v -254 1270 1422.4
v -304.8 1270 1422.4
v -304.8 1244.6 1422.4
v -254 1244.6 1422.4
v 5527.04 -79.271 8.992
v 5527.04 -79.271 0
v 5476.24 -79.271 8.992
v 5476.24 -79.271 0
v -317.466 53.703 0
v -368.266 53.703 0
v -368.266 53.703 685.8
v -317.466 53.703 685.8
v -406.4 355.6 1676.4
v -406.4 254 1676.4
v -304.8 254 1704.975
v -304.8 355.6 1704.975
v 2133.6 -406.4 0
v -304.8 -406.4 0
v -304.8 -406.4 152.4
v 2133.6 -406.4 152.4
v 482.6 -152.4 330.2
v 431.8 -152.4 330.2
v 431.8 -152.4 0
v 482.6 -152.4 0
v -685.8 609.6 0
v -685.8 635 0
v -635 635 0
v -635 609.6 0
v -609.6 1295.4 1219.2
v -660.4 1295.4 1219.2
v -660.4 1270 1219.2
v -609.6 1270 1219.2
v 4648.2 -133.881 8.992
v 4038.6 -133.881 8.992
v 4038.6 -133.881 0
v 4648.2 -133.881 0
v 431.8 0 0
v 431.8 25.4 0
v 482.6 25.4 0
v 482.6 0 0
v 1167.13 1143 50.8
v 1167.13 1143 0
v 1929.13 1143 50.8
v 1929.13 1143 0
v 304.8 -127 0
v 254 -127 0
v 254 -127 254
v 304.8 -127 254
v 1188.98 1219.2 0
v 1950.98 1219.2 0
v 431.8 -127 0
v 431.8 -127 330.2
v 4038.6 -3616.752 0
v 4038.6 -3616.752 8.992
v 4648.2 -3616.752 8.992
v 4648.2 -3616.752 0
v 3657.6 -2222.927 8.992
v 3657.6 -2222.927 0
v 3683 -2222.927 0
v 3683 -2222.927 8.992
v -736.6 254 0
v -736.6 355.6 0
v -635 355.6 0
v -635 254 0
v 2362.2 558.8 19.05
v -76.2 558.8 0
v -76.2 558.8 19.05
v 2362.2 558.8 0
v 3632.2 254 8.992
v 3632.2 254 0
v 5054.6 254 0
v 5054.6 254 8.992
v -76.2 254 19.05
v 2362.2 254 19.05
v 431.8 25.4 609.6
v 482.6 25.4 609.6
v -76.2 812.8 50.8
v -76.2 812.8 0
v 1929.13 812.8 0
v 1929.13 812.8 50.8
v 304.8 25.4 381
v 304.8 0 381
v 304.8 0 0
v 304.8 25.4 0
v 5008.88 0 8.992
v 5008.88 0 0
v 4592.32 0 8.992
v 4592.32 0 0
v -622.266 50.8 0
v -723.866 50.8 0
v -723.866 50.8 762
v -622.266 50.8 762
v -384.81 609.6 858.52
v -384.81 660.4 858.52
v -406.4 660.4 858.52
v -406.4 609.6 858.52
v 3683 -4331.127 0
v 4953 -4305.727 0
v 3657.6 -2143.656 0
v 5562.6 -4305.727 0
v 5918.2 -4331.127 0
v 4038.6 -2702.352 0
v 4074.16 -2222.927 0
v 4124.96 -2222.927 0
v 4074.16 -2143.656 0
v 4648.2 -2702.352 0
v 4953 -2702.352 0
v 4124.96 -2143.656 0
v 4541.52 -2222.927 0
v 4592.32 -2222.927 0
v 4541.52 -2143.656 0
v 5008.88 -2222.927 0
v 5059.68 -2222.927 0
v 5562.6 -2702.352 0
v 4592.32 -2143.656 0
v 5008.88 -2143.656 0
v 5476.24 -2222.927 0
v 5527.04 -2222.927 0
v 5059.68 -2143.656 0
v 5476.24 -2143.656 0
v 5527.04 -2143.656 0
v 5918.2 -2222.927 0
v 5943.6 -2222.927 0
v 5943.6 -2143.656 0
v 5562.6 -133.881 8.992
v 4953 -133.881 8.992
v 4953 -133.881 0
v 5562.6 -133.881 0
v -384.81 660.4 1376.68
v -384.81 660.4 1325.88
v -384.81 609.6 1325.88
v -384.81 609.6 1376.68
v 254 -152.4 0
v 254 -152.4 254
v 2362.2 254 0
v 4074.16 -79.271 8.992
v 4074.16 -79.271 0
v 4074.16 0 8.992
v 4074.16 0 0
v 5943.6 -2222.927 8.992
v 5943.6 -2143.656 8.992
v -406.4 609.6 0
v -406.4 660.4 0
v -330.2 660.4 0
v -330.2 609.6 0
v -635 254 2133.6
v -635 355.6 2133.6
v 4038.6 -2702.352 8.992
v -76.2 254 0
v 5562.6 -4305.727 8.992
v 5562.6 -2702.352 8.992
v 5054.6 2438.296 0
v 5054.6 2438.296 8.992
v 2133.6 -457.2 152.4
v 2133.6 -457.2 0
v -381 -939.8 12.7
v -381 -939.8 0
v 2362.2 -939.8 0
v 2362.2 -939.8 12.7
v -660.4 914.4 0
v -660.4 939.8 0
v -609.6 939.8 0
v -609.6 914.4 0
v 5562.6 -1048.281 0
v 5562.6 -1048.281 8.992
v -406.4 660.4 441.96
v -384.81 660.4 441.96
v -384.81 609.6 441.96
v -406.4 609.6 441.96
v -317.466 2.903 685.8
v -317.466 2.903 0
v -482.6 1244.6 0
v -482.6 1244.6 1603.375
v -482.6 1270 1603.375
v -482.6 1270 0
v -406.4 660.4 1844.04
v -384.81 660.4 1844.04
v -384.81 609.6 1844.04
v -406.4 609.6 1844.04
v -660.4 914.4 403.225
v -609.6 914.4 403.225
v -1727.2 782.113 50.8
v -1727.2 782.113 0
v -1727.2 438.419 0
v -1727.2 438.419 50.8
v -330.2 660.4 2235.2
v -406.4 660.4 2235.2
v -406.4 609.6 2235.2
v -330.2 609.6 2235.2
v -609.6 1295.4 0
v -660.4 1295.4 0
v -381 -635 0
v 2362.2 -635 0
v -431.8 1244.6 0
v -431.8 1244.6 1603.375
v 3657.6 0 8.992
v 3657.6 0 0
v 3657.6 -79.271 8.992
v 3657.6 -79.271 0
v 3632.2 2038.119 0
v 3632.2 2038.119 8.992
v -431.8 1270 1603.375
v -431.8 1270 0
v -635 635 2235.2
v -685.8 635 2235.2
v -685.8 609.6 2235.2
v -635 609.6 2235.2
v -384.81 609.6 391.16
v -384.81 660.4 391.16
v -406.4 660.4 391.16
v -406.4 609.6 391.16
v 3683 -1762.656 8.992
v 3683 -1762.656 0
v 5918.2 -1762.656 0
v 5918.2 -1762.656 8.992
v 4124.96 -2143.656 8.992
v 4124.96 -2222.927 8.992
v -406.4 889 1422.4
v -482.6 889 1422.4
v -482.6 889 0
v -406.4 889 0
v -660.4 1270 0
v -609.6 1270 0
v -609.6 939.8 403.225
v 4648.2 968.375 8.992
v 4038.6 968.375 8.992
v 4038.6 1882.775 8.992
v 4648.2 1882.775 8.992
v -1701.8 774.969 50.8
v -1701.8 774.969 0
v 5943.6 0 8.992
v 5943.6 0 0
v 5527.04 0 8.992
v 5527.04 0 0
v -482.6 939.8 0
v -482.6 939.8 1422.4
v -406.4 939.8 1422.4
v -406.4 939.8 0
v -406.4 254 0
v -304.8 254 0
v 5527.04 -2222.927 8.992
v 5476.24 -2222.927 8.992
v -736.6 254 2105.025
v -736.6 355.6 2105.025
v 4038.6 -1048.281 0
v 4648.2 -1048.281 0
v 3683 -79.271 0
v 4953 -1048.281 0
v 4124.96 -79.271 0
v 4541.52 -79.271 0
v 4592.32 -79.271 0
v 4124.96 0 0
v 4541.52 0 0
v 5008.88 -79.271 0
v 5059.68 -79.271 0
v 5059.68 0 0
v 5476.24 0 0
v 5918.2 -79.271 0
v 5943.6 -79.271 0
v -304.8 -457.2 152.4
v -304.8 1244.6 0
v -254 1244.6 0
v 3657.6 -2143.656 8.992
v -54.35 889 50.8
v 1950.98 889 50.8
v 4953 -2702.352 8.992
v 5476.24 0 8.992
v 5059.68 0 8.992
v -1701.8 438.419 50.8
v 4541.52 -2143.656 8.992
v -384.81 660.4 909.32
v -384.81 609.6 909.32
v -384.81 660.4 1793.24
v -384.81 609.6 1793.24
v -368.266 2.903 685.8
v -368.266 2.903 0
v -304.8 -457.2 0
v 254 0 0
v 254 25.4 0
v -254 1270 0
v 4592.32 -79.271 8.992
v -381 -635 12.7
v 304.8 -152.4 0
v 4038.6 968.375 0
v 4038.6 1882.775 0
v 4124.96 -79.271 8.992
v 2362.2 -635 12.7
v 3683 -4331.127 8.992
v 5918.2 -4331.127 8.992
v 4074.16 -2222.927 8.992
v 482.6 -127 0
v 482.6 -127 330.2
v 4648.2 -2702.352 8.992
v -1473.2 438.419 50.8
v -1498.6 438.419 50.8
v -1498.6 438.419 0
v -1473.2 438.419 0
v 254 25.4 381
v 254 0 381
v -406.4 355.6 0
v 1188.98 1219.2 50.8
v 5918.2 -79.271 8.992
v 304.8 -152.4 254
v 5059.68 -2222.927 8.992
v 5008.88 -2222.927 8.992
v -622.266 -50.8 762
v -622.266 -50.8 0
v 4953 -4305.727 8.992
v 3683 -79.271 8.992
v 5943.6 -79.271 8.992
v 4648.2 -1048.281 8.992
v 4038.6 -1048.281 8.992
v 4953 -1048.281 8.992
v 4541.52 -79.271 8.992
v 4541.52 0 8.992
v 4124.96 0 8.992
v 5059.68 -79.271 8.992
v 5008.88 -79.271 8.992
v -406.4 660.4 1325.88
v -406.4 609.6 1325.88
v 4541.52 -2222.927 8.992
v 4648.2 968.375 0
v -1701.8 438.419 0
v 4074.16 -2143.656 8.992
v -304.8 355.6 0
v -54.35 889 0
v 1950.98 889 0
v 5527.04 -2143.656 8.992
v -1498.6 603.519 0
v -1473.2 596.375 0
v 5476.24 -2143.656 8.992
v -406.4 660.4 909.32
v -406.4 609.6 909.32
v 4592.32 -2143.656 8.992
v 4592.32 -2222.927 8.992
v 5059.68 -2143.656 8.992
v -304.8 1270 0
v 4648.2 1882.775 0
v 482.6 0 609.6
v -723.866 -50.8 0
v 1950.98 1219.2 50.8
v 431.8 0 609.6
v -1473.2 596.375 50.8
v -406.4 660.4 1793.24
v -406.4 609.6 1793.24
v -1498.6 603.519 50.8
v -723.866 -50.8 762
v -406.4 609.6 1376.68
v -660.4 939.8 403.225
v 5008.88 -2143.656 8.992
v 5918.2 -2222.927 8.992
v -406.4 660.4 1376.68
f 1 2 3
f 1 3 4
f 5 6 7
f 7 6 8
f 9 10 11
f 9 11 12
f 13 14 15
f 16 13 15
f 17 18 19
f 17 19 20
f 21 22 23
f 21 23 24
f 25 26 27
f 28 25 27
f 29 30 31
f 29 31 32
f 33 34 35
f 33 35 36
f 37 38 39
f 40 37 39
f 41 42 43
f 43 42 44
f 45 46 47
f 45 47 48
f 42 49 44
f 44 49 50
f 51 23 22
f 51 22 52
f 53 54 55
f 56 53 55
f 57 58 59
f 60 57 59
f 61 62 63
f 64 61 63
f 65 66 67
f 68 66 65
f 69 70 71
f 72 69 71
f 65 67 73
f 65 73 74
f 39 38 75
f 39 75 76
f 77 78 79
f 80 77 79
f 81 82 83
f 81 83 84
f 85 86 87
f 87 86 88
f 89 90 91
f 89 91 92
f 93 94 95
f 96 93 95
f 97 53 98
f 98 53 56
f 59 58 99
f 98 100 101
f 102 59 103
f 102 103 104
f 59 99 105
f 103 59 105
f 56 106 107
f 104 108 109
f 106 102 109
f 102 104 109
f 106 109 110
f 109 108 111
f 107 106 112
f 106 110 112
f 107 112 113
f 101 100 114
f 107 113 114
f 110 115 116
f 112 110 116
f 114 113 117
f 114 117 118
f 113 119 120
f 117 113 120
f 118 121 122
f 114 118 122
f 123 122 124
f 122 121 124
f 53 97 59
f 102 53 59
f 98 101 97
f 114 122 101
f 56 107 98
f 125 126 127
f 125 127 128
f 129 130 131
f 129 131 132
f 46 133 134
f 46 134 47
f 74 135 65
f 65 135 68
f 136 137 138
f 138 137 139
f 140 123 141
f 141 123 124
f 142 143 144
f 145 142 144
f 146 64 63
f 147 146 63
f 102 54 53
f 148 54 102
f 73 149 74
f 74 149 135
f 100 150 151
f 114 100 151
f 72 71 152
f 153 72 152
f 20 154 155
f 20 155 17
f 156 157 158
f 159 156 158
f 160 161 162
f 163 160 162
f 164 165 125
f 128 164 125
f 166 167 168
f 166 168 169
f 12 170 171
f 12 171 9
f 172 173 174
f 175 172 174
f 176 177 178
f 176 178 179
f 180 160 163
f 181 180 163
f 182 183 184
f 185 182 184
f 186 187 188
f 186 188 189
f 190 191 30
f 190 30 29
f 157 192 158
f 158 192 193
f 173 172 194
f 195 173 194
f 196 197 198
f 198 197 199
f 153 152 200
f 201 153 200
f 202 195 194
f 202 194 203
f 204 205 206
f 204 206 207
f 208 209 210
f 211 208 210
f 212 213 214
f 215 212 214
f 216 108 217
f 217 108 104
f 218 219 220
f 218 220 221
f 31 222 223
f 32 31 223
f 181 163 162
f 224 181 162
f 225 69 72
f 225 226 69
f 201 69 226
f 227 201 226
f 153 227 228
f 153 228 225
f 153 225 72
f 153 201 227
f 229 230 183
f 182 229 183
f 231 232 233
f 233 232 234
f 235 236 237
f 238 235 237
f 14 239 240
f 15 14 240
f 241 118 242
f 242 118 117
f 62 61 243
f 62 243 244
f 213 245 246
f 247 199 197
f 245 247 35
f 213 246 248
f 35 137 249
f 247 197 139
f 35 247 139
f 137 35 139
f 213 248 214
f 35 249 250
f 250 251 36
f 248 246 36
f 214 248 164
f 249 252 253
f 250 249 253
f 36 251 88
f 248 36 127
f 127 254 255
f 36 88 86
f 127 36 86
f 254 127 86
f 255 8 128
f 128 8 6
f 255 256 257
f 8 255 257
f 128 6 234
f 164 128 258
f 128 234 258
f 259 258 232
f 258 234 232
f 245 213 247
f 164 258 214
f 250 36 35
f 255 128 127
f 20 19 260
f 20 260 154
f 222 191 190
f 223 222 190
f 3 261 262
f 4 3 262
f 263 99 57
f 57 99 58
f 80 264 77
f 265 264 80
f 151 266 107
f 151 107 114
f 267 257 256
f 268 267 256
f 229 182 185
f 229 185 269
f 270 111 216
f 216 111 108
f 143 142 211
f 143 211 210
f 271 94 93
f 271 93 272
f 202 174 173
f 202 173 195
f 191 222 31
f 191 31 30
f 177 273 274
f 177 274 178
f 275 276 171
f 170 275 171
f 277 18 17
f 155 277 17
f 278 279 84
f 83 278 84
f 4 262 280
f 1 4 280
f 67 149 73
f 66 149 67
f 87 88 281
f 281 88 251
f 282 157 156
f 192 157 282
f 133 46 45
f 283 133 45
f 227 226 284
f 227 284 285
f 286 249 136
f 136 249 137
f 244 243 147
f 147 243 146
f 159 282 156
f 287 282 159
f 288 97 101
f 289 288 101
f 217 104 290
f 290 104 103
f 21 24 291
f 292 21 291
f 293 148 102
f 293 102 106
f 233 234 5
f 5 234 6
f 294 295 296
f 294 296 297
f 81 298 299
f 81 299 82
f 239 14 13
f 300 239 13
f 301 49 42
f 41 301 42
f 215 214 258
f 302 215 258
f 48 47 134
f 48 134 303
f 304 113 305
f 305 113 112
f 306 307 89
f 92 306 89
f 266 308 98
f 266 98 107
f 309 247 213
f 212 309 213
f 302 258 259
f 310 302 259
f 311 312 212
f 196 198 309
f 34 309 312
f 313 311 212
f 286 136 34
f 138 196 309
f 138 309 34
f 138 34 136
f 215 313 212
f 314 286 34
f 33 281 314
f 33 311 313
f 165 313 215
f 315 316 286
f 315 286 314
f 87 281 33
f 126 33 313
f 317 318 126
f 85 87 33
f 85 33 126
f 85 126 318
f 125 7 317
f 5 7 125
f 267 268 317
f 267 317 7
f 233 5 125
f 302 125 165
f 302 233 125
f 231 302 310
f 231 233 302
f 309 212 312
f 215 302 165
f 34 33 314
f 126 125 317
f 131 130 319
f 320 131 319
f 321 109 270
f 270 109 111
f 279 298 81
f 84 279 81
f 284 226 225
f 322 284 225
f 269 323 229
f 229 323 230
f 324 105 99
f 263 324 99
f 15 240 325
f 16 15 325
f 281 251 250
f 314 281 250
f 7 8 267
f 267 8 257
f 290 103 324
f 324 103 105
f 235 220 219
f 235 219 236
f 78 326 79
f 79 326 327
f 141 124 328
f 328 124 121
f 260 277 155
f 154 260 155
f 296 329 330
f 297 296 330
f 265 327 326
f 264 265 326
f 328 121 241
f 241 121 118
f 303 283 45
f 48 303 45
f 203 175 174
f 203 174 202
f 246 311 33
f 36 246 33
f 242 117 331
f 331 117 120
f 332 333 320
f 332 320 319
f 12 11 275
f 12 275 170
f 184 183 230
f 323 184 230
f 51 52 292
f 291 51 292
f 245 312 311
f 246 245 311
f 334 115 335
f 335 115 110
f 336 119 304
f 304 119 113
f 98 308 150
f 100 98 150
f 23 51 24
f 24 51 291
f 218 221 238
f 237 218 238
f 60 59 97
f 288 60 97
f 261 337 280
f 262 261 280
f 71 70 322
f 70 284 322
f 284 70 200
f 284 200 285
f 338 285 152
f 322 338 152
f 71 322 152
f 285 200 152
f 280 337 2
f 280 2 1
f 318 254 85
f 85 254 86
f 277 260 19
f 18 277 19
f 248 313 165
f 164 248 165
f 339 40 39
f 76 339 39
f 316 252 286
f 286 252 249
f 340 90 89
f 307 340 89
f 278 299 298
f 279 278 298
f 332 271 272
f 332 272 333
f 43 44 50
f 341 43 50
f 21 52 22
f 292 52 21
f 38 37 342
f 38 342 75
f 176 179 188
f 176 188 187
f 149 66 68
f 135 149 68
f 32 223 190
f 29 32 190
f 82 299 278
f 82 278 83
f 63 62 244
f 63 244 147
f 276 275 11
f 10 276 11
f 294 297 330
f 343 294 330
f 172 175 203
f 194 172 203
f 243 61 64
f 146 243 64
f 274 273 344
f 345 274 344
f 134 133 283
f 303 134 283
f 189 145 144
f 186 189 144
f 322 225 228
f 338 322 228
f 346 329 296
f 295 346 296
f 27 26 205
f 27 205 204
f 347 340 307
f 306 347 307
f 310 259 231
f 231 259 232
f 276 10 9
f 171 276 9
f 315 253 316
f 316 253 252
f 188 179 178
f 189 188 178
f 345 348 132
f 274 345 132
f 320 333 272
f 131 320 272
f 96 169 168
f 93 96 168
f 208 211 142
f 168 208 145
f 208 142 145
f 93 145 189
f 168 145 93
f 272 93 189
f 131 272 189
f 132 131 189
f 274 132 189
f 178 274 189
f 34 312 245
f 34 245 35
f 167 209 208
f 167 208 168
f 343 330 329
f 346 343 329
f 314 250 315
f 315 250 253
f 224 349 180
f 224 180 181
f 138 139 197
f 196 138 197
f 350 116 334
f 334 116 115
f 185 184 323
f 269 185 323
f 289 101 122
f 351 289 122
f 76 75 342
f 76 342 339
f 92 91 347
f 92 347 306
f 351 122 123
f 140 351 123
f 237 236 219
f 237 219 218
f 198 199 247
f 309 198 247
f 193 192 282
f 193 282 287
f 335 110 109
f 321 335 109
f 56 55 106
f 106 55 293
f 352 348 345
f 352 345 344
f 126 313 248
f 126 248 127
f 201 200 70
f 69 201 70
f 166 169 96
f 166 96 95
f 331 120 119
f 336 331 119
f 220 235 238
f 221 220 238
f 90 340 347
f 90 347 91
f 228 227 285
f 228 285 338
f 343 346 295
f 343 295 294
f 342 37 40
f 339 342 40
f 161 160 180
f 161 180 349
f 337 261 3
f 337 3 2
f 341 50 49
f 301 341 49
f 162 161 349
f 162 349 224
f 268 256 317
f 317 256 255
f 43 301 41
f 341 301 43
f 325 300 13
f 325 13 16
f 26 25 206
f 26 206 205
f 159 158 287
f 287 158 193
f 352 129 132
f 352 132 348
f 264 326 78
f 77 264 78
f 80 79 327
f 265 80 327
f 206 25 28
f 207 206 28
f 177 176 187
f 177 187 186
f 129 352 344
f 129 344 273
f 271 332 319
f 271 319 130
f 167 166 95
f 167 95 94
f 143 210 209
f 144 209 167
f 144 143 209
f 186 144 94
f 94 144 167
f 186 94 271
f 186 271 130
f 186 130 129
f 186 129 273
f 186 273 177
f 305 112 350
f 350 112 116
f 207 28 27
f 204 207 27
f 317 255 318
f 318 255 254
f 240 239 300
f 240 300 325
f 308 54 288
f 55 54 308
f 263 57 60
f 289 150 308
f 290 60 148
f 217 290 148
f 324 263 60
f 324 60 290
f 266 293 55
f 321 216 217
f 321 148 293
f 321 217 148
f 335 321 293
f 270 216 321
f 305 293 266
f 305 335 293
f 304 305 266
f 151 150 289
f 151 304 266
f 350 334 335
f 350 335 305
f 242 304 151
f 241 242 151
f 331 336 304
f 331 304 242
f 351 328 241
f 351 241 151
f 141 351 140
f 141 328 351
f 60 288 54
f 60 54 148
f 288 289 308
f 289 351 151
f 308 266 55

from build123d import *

# Parameters (mm, degrees)
F1_DEPTH  = 152.4
F2_W      = 101.6
F2_H      = 101.6
F3_DEPTH  = 2133.6
F5_DEPTH  = 101.6
F6_W      = 101.6
F6_H      = 101.6
F7_DEPTH  = 1704.975
F9_DEPTH  = 101.6
F10_W     = 2438.4
F10_H     = 304.8
F11_DEPTH = 19.05
F13_DEPTH = 50.8
F14_W     = 76.2
F14_H     = 50.8
F15_DEPTH = 2235.2
F16_W     = 76.2
F16_H     = 50.8
F17_DEPTH = 1422.4
F18_W     = 21.59
F18_H     = 50.8
F19_DEPTH = 50.8
F20_W     = 50.8
F20_H     = 25.4
F21_DEPTH = 2235.2
F22_W     = 50.8
F22_H     = 25.4
F23_DEPTH = 1628.775
F24_W     = 50.8
F24_H     = 25.4
F25_DEPTH = 1219.2
F26_W     = 50.8
F26_H     = 25.4
F27_DEPTH = 1603.375
F28_W     = 50.8
F28_H     = 25.4
F29_DEPTH = 1422.4
F31_DEPTH = 50.8
F32_W     = 2438.4
F32_H     = 50.8
F33_DEPTH = 152.4
F36_W     = 50.8
F36_H     = 25.4
F37_DEPTH = 381
F38_W     = 50.8
F38_H     = 25.4
F39_DEPTH = 609.6
F40_W     = 50.8
F40_H     = 25.4
F41_DEPTH = 254
F42_W     = 50.8
F42_H     = 25.4
F43_DEPTH = 330.2
F44_W     = 2743.2
F44_H     = 304.8
F45_DEPTH = 12.7
F47_DEPTH = 8.9916
F48_W     = 609.6
F48_H     = 914.4
F49_DEPTH = 8.9916
F50_W     = 50.8
F50_H     = 25.4
F51_DEPTH = 403.225
F53_DEPTH = 50.8
F54_DEPTH = 50.8
F56_DEPTH = 8.9916
F57_W     = 609.6
F57_H     = 914.4
F58_DEPTH = 8.9916
F60_DEPTH = 8.9916
F61_W     = 609.6
F61_H     = 914.4
F61_H_2   = 1603.375
F62_DEPTH = 8.9916
F63_W     = 50.799991
F63_H     = 50.8
F64_DEPTH = 685.8
F65_W     = 101.6
F65_H     = 101.6
F66_DEPTH = 762


with BuildPart() as f1:
    # F0 (on Front) → F1 (new body)
    with BuildSketch(Plane.XZ):
        Polygon((-304.8, 152.4), (0, 0), (1828.8, 0), (2133.6, 152.4), (2133.6, 203.2), (-304.8, 203.2), align=None)
    extrude(amount=F1_DEPTH)


with BuildPart() as f3:
    # F2 (on Top) → F3 (new body)
    with BuildSketch(Plane.XY):
        with Locations((-685.8, 304.8)):
            Rectangle(F2_W, F2_H)
    extrude(amount=F3_DEPTH)

    # F4 (on face) → F5 (cut, through all)
    with BuildSketch(Plane.XZ.offset(-254)):
        Polygon((-635, 2133.6), (-736.6, 2133.6), (-736.6, 2105.025), align=None)
    extrude(amount=-F5_DEPTH, mode=Mode.SUBTRACT)


with BuildPart() as f7:
    # F6 (on Top) → F7 (new body)
    with BuildSketch(Plane.XY):
        with Locations((-355.6, 304.8)):
            Rectangle(F6_W, F6_H)
    extrude(amount=F7_DEPTH)

    # F8 (on face) → F9 (cut, through all)
    with BuildSketch(Plane.XZ.offset(-254)):
        Polygon((-304.8, 1704.975), (-406.4, 1704.975), (-406.4, 1676.4), align=None)
    extrude(amount=-F9_DEPTH, mode=Mode.SUBTRACT)


with BuildPart() as f11:
    # F10 (on Top) → F11 (new body)
    with BuildSketch(Plane.XY):
        with Locations((1143, 406.4)):
            Rectangle(F10_W, F10_H)
    extrude(amount=F11_DEPTH)


with BuildPart() as f13:
    # F12 (on Top) → F13 (new body)
    with BuildSketch(Plane.XY):
        Polygon((-54.350002, 889), (-76.2, 812.8), (1929.13, 812.8), (1950.979998, 889), align=None)
    extrude(amount=F13_DEPTH)


with BuildPart() as f15:
    # F14 (on Top) → F15 (new body)
    with BuildSketch(Plane.XY):
        with Locations((-368.3, 635)):
            Rectangle(F14_W, F14_H)
    extrude(amount=F15_DEPTH)

    # F18 (on face) → F19 (cut, through all)
    with BuildSketch(Plane(origin=(0, 660.4, 0), x_dir=(-1, 0, 0), z_dir=(0, 1, 0))):
        with Locations((395.605, 1818.64)):
            Rectangle(F18_W, F18_H)
        with Locations((395.605, 1351.28)):
            Rectangle(F18_W, F18_H)
        with Locations((395.605, 883.92)):
            Rectangle(F18_W, F18_H)
        with Locations((395.605, 416.56)):
            Rectangle(F18_W, F18_H)
    extrude(amount=-F19_DEPTH, mode=Mode.SUBTRACT)


with BuildPart() as f17:
    # F16 (on Top) → F17 (new body)
    with BuildSketch(Plane.XY):
        with Locations((-444.5, 914.4)):
            Rectangle(F16_W, F16_H)
    extrude(amount=F17_DEPTH)


with BuildPart() as f21:
    # F20 (on Top) → F21 (new body)
    with BuildSketch(Plane.XY):
        with Locations((-660.4, 622.3)):
            Rectangle(F20_W, F20_H)
    extrude(amount=F21_DEPTH)


with BuildPart() as f23:
    # F22 (on Top) → F23 (new body)
    with BuildSketch(Plane.XY):
        with Locations((-635, 876.3)):
            Rectangle(F22_W, F22_H)
    extrude(amount=F23_DEPTH)


with BuildPart() as f25:
    # F24 (on Top) → F25 (new body)
    with BuildSketch(Plane.XY):
        with Locations((-635, 1282.7)):
            Rectangle(F24_W, F24_H)
    extrude(amount=F25_DEPTH)


with BuildPart() as f27:
    # F26 (on Top) → F27 (new body)
    with BuildSketch(Plane.XY):
        with Locations((-457.2, 1257.3)):
            Rectangle(F26_W, F26_H)
    extrude(amount=F27_DEPTH)


with BuildPart() as f29:
    # F28 (on Top) → F29 (new body)
    with BuildSketch(Plane.XY):
        with Locations((-279.4, 1257.3)):
            Rectangle(F28_W, F28_H)
    extrude(amount=F29_DEPTH)


with BuildPart() as f31:
    # F30 (on Top) → F31 (new body)
    with BuildSketch(Plane.XY):
        Polygon((1929.13, 1143), (1950.979998, 1219.2), (1188.979998, 1219.2), (1167.13, 1143), align=None)
    extrude(amount=F31_DEPTH)


with BuildPart() as f33:
    # F32 (on Top) → F33 (new body)
    with BuildSketch(Plane.XY):
        with Locations((914.4, -431.8)):
            Rectangle(F32_W, F32_H)
    extrude(amount=F33_DEPTH)


with BuildPart() as f37:
    # F36 (on Top) → F37 (new body)
    with BuildSketch(Plane.XY):
        with Locations((279.4, 12.7)):
            Rectangle(F36_W, F36_H)
    extrude(amount=F37_DEPTH)


with BuildPart() as f39:
    # F38 (on Top) → F39 (new body)
    with BuildSketch(Plane.XY):
        with Locations((457.2, 12.7)):
            Rectangle(F38_W, F38_H)
    extrude(amount=F39_DEPTH)


with BuildPart() as f41:
    # F40 (on Top) → F41 (new body)
    with BuildSketch(Plane.XY):
        with Locations((279.4, -139.7)):
            Rectangle(F40_W, F40_H)
    extrude(amount=F41_DEPTH)


with BuildPart() as f43:
    # F42 (on Top) → F43 (new body)
    with BuildSketch(Plane.XY):
        with Locations((457.2, -139.7)):
            Rectangle(F42_W, F42_H)
    extrude(amount=F43_DEPTH)


with BuildPart() as f45:
    # F44 (on Top) → F45 (new body)
    with BuildSketch(Plane.XY):
        with Locations((990.6, -787.4)):
            Rectangle(F44_W, F44_H)
    extrude(amount=F45_DEPTH)


with BuildPart() as f47:
    # F46 (on Top) → F47 (new body)
    with BuildSketch(Plane.XY):
        Polygon((3632.2, 2038.11886), (3632.2, 254), (5054.6, 254), (5054.6, 2438.29586), align=None)
    extrude(amount=F47_DEPTH)

    # F48 (on face) → F49 (cut, through all)
    with BuildSketch(Plane.XY.offset(8.9916)):
        with Locations((4343.4, 1425.575)):
            Rectangle(F48_W, F48_H)
    extrude(amount=-F49_DEPTH, mode=Mode.SUBTRACT)


with BuildPart() as f51:
    # F50 (on Top) → F51 (new body)
    with BuildSketch(Plane.XY):
        with Locations((-635, 927.1)):
            Rectangle(F50_W, F50_H)
    extrude(amount=F51_DEPTH)


with BuildPart() as f53:
    # F52 (on Top) → F53 (new body)
    with BuildSketch(Plane.XY):
        Polygon((-1701.8, 774.969164), (-1727.2, 782.112914), (-1727.2, 438.419164), (-1701.8, 438.419164), align=None)
    extrude(amount=F53_DEPTH)

    # F52 (on Top) → F54 (join)
    with BuildSketch(Plane.XY):
        Polygon((-1701.8, 774.969164), (-1727.2, 782.112914), (-1727.2, 438.419164), (-1701.8, 438.419164), align=None)
        Polygon((-1498.6, 603.519164), (-1498.6, 438.419164), (-1473.2, 438.419164), (-1473.2, 596.375414), align=None)
    extrude(amount=F54_DEPTH)


with BuildPart() as f56:
    # F55 (on Top) → F56 (new body)
    with BuildSketch(Plane.XY):
        Polygon((4074.16, 0), (3657.6, 0), (3657.6, -79.27086), (3683, -79.27086), (3683, -1762.65586), (5918.2, -1762.65586), (5918.2, -79.27086), (5943.6, -79.27086), (5943.6, 0), (5527.04, 0), (5527.04, -79.27086), (5476.24, -79.27086), (5476.24, 0), (5059.68, 0), (5059.68, -79.27086), (5008.88, -79.27086), (5008.88, 0), (4592.32, 0), (4592.32, -79.27086), (4541.52, -79.27086), (4541.52, 0), (4124.96, 0), (4124.96, -79.27086), (4074.16, -79.27086), align=None)
    extrude(amount=F56_DEPTH)

    # F57 (on face) → F58 (cut, through all)
    with BuildSketch(Plane.XY.offset(8.9916)):
        with Locations((4343.4, -591.08086)):
            Rectangle(F57_W, F57_H)
        with Locations((5257.8, -591.08086)):
            Rectangle(F57_W, F57_H)
    extrude(amount=-F58_DEPTH, mode=Mode.SUBTRACT)


with BuildPart() as f60:
    # F59 (on Top) → F60 (new body)
    with BuildSketch(Plane.XY):
        Polygon((4074.16, -2143.65586), (3657.6, -2143.65586), (3657.6, -2222.92672), (3683, -2222.92672), (3683, -4331.12672), (5918.2, -4331.12672), (5918.2, -2222.92672), (5943.6, -2222.92672), (5943.6, -2143.65586), (5527.04, -2143.65586), (5527.04, -2222.92672), (5476.24, -2222.92672), (5476.24, -2143.65586), (5059.68, -2143.65586), (5059.68, -2222.92672), (5008.88, -2222.92672), (5008.88, -2143.65586), (4592.32, -2143.65586), (4592.32, -2222.92672), (4541.52, -2222.92672), (4541.52, -2143.65586), (4124.96, -2143.65586), (4124.96, -2222.92672), (4074.16, -2222.92672), align=None)
    extrude(amount=F60_DEPTH)

    # F61 (on face) → F62 (cut, through all)
    with BuildSketch(Plane.XY.offset(8.9916)):
        with Locations((4343.4, -3159.55172)):
            Rectangle(F61_W, F61_H)
        with Locations((5257.8, -3504.03922)):
            Rectangle(F61_W, F61_H_2)
    extrude(amount=-F62_DEPTH, mode=Mode.SUBTRACT)


with BuildPart() as f64:
    # F63 (on Top) → F64 (new body)
    with BuildSketch(Plane.XY):
        with Locations((-342.866048, 28.302594)):
            Rectangle(F63_W, F63_H)
    extrude(amount=F64_DEPTH)


with BuildPart() as f66:
    # F65 (on Top) → F66 (new body)
    with BuildSketch(Plane.XY):
        with Locations((-673.066044, 0)):
            Rectangle(F65_W, F65_H)
    extrude(amount=F66_DEPTH)


solid = Compound([f3.part, f7.part, f11.part, f13.part, f15.part, f17.part, f21.part, f25.part, f27.part, f29.part, f31.part, f33.part, f37.part, f39.part, f41.part, f43.part, f45.part, f47.part, f51.part, f53.part, f56.part, f60.part, f64.part, f66.part])
